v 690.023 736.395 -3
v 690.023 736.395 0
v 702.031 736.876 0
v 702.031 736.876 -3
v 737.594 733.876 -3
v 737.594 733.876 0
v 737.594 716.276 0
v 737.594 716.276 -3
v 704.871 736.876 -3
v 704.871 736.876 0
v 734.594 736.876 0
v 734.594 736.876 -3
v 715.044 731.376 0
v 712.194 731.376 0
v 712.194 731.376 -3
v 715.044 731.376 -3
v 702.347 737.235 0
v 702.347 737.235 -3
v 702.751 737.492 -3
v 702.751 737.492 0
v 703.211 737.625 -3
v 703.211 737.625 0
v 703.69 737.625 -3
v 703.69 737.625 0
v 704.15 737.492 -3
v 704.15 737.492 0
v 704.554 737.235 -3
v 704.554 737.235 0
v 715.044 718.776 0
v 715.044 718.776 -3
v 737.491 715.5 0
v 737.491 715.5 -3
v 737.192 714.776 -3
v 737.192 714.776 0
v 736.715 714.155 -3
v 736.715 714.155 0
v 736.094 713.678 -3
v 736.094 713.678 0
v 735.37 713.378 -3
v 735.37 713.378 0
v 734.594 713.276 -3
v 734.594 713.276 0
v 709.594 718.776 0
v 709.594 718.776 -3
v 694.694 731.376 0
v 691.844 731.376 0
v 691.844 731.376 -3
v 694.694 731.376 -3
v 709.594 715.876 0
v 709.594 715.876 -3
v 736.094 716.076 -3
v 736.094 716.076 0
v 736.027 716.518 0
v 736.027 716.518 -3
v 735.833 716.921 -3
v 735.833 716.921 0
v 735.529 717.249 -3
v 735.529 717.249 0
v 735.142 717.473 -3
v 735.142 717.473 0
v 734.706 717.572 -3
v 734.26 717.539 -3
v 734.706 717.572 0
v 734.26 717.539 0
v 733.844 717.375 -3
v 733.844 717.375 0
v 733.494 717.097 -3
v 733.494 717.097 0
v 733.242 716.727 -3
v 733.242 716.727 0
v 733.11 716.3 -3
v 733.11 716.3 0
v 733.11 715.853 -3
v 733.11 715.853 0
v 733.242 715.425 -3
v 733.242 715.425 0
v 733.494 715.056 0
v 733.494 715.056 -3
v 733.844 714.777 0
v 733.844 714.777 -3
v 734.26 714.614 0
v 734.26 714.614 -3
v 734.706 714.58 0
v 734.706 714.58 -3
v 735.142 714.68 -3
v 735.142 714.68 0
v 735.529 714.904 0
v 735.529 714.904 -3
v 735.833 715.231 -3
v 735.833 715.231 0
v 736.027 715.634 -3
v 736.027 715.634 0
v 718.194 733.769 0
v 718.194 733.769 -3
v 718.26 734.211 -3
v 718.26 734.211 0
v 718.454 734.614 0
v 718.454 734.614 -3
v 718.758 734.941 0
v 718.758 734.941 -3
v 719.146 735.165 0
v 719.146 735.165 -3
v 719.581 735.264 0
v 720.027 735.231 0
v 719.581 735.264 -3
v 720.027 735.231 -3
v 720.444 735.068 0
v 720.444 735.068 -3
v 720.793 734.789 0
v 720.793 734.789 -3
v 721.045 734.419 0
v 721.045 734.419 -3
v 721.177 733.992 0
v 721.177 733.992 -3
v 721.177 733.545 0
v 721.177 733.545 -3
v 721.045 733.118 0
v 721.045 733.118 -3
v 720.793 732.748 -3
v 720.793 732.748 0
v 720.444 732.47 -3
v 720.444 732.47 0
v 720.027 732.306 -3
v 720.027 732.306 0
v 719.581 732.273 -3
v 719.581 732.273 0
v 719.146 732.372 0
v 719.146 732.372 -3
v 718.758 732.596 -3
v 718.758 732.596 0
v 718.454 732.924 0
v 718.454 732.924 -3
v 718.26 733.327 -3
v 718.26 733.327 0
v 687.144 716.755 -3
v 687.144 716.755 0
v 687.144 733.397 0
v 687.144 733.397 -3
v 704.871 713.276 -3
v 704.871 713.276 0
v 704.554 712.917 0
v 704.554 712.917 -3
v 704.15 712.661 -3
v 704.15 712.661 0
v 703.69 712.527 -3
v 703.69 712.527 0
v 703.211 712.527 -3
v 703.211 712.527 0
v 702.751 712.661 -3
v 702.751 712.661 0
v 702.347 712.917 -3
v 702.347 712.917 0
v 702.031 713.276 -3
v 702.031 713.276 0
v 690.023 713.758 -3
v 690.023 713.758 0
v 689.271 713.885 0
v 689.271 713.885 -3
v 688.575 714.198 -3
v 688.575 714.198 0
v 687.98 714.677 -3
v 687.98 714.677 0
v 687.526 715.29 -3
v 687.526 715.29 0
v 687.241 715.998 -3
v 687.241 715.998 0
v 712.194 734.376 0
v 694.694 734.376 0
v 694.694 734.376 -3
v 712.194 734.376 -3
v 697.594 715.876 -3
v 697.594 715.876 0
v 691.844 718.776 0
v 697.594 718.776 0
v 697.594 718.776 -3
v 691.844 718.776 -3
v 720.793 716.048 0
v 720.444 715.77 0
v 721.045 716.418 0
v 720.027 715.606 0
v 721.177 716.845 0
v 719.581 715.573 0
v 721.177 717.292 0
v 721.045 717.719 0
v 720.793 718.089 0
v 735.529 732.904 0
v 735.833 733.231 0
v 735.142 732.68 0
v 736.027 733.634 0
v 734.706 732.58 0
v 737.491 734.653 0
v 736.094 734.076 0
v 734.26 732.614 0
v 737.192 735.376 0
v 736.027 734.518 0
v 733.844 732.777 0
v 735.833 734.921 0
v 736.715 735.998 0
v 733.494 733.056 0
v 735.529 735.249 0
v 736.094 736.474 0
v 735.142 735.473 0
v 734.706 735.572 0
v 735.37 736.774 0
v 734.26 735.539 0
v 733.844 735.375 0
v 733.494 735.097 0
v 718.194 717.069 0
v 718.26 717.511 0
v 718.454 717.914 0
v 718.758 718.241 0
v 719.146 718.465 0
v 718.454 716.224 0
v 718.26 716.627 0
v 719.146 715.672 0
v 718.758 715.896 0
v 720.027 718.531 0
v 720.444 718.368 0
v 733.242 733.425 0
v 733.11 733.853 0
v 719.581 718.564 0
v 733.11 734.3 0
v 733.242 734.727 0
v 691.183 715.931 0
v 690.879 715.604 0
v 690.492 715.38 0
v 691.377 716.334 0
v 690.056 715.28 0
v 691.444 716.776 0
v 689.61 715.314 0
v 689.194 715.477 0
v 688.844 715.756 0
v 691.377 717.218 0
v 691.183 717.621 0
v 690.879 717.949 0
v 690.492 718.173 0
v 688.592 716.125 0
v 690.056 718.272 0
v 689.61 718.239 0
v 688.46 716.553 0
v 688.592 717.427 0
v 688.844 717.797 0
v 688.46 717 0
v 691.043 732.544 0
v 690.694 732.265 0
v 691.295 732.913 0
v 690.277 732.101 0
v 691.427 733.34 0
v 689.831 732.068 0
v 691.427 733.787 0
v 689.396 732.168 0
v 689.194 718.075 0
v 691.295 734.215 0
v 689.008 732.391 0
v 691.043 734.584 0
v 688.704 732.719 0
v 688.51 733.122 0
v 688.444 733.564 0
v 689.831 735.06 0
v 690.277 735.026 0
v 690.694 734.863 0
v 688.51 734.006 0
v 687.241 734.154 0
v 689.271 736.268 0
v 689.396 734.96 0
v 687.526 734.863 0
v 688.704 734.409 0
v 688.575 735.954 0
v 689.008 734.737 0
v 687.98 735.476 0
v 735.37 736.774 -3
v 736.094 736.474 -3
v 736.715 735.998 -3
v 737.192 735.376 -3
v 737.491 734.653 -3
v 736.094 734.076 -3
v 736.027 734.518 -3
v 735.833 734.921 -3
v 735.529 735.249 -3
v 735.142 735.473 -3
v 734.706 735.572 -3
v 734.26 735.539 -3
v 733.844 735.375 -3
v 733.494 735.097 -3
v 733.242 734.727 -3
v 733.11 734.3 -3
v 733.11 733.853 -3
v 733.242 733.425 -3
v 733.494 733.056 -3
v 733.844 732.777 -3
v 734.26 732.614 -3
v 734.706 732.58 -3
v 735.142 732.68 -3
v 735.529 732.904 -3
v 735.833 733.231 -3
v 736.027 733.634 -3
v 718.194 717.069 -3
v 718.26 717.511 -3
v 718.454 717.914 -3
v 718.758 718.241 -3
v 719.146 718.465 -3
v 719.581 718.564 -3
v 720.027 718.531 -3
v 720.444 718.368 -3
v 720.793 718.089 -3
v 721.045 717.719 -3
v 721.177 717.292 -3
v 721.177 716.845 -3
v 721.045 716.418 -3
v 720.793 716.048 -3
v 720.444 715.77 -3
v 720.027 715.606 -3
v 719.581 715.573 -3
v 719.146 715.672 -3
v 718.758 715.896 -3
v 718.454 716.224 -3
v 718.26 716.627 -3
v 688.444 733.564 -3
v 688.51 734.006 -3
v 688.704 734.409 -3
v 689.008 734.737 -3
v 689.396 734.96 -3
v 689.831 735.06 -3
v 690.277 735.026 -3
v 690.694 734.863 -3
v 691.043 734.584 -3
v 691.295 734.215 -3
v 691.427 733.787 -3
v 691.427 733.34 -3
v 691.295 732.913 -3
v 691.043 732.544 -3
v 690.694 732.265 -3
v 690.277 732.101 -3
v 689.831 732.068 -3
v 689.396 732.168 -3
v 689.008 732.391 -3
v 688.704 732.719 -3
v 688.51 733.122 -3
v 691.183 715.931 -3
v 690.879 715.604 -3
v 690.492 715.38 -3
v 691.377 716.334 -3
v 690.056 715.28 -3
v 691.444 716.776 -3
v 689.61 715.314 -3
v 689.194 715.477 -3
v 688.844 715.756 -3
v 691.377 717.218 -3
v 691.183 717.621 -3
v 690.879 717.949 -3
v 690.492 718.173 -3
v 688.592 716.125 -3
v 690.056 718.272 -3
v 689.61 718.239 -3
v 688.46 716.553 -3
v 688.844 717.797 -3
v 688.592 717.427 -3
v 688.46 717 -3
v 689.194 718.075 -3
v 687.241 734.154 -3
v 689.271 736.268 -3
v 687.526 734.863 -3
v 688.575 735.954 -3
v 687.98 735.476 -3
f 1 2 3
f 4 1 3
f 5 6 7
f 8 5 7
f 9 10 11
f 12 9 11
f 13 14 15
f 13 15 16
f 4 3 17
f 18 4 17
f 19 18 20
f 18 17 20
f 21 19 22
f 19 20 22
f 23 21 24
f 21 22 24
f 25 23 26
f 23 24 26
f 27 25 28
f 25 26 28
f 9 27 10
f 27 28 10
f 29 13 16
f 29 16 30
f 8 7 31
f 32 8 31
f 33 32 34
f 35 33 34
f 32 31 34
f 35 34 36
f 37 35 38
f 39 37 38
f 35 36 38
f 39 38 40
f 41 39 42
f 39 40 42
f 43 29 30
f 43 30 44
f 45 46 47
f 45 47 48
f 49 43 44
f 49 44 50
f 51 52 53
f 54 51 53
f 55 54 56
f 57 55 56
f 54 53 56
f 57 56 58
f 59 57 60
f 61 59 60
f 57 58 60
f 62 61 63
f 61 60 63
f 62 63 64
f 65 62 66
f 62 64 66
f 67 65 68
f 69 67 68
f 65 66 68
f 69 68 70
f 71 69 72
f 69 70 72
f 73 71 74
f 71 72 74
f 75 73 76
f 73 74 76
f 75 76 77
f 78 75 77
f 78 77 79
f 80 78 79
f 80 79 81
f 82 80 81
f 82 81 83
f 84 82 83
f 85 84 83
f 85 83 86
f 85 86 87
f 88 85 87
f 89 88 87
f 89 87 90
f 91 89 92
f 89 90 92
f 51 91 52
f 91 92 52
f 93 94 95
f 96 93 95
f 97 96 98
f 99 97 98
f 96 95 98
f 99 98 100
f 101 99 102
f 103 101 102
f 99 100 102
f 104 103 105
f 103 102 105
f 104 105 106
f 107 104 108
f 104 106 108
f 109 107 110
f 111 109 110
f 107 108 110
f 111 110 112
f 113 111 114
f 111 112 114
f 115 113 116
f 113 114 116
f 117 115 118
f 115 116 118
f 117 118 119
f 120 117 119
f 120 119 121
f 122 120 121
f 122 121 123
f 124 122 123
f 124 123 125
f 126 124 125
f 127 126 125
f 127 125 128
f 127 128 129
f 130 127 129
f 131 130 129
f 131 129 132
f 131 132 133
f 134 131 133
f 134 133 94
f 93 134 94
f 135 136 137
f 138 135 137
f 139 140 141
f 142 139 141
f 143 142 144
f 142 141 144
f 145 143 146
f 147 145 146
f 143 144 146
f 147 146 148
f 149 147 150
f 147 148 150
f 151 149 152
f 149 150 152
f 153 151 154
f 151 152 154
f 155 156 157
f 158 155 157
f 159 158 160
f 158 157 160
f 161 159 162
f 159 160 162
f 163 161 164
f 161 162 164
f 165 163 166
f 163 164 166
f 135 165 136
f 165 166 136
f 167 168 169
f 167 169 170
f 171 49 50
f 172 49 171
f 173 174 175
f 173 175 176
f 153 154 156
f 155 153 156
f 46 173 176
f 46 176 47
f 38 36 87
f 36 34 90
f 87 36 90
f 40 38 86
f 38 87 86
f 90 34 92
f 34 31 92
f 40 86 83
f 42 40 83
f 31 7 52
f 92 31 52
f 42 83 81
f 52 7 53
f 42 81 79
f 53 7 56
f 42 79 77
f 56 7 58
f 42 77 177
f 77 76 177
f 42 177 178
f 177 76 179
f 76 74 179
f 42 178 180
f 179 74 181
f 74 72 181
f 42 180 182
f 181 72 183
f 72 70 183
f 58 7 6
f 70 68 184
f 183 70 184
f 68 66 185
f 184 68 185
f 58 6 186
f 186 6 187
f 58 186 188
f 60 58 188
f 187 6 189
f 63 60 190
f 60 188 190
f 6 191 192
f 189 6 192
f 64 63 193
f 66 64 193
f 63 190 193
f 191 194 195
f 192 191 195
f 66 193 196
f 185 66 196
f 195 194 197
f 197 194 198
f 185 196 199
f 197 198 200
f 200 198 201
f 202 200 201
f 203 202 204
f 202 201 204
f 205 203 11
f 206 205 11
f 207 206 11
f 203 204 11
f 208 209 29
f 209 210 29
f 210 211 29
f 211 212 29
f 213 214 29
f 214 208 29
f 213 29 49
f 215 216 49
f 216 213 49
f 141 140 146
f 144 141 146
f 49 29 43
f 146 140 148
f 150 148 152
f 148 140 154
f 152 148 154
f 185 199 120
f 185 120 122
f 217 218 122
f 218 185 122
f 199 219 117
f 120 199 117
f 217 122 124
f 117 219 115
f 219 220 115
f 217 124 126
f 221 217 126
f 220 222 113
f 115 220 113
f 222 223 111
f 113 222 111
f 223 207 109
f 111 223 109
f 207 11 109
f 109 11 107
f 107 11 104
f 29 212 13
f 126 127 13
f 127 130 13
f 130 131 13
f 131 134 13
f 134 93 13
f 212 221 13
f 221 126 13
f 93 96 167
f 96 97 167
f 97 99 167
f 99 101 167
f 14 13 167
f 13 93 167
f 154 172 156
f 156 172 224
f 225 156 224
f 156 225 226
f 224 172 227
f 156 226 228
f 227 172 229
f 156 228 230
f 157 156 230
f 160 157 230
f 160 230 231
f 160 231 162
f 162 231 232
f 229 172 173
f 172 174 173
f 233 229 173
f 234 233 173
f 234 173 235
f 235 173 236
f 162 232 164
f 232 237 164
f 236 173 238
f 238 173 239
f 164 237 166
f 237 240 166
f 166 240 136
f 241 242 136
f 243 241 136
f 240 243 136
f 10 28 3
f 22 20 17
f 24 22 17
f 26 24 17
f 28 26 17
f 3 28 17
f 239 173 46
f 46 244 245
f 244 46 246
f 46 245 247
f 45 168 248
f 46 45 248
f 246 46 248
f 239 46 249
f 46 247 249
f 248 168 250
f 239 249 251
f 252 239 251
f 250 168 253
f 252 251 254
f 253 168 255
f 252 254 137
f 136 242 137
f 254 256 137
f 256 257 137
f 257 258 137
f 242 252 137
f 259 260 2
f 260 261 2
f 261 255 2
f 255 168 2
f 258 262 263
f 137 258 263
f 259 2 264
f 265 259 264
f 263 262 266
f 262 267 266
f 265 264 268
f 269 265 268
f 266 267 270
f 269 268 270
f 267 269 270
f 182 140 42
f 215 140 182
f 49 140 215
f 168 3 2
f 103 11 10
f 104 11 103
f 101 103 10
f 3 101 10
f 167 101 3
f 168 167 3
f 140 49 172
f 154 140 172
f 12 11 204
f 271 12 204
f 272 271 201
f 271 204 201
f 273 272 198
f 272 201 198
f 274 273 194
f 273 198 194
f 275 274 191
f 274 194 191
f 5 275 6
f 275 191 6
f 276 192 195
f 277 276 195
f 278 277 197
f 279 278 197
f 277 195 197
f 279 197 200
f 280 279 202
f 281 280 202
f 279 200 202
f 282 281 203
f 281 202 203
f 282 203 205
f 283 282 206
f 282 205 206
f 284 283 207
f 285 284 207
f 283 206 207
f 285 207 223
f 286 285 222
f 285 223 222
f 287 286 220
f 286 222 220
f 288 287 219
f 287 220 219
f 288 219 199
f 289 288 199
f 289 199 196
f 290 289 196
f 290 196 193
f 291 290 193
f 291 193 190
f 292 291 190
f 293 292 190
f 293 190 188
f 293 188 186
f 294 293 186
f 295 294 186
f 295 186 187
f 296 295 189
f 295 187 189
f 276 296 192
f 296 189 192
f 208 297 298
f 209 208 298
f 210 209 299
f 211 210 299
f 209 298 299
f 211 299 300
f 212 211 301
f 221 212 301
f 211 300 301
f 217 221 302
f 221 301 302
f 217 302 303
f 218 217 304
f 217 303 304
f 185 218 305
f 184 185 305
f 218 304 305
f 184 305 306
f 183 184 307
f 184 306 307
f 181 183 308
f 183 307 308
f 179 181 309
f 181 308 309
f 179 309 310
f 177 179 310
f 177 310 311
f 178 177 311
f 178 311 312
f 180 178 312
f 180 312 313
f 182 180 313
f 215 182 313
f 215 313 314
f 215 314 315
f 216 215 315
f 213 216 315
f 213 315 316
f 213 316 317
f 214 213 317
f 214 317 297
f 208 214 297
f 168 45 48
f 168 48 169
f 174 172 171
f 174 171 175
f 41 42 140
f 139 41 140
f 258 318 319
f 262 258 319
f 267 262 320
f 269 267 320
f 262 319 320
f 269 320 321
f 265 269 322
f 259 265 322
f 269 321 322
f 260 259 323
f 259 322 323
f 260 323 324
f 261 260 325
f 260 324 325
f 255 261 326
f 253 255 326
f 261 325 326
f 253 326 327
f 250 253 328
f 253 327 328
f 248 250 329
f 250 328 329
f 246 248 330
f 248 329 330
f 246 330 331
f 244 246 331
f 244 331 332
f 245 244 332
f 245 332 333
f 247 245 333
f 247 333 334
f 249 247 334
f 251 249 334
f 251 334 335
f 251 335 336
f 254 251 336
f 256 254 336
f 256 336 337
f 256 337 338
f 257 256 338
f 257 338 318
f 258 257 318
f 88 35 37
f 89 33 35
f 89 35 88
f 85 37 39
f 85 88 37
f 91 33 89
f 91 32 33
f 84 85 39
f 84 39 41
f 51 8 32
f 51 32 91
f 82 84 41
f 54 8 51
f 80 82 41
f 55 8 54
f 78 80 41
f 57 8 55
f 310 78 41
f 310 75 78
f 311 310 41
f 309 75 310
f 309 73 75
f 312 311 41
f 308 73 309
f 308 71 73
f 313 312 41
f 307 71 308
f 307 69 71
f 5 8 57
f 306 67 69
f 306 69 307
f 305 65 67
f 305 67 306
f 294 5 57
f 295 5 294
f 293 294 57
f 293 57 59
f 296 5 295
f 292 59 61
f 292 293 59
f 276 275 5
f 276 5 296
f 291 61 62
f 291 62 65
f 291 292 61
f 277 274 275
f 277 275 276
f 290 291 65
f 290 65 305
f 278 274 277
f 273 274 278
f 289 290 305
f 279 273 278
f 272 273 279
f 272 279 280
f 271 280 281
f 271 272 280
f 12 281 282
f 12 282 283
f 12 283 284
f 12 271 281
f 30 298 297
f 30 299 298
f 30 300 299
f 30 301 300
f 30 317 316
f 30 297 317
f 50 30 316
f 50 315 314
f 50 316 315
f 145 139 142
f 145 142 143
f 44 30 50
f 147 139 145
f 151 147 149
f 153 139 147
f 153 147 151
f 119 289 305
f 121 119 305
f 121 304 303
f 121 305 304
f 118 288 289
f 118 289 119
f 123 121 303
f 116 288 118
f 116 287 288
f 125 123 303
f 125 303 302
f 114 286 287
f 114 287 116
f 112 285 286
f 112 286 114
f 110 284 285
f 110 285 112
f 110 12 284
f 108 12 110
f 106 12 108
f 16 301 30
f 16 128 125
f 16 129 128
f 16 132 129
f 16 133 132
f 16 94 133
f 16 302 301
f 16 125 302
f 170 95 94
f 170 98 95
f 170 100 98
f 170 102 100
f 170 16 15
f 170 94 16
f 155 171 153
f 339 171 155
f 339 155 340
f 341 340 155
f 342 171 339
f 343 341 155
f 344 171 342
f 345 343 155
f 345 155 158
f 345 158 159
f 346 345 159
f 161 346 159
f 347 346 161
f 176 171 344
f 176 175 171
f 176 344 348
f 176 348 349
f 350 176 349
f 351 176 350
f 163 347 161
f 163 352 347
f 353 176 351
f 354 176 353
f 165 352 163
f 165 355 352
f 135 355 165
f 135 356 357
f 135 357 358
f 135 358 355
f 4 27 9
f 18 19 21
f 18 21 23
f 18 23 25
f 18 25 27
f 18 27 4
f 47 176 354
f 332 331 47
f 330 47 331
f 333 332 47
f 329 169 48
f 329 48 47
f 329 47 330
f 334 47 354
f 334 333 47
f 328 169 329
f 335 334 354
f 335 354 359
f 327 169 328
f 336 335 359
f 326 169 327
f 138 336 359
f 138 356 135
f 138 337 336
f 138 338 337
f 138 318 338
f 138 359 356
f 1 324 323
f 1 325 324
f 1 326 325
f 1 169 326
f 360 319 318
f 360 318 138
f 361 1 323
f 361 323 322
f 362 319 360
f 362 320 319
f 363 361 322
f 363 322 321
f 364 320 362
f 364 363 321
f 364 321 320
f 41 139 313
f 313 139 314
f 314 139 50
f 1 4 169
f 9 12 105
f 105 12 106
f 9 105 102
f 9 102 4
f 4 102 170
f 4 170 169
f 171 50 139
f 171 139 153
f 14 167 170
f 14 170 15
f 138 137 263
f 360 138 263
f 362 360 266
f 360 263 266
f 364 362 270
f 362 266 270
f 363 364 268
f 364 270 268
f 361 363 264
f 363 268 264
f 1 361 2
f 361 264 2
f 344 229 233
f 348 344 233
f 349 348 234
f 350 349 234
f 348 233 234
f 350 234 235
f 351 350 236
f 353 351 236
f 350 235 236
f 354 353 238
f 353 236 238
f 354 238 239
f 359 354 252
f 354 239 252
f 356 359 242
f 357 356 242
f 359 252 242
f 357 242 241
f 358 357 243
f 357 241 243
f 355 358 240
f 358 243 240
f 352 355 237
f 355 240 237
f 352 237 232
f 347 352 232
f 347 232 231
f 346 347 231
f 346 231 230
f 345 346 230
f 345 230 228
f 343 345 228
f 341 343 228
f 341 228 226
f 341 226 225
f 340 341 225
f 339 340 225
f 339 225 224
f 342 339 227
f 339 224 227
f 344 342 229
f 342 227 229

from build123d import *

# Parameters (mm, degrees)
ESQUISSE1_R               = 1.5
T_LE_DE_BASE_PLI_E1_DEPTH = 3
ESQUISSE6_R               = 1.5
ENL_V_MAT_EXTRU_2_DEPTH   = 10


# Sheet-metal steps are written as plain solids
with BuildPart() as part:
    # Esquisse1 → Tôle de base pliée1 (new body)
    with BuildSketch(Plane.XY):
        with BuildLine():
            Line((737.593549902, 733.8762623), (737.593549902, 716.2762623))
            ThreePointArc((737.593549902, 716.2762623), (736.714870246, 714.154941957), (734.593549902, 713.2762623))
            Line((734.593549902, 713.2762623), (704.870597735, 713.2762623))
            ThreePointArc((704.870597735, 713.2762623), (703.450597735, 712.510086472), (702.030597735, 713.2762623))
            Line((702.030597735, 713.2762623), (690.023398786, 713.757541233))
            ThreePointArc((690.023398786, 713.757541233), (687.980166748, 714.67672778), (687.143549902, 716.755134219))
            Line((687.143549902, 716.755134219), (687.143549902, 733.397390382))
            ThreePointArc((687.143549902, 733.397390382), (687.980166748, 735.475796821), (690.023398786, 736.394983368))
            Line((690.023398786, 736.394983368), (702.030597735, 736.8762623))
            ThreePointArc((702.030597735, 736.8762623), (703.450597735, 737.642438129), (704.870597735, 736.8762623))
            Line((704.870597735, 736.8762623), (734.593549902, 736.8762623))
            ThreePointArc((734.593549902, 736.8762623), (736.714870246, 735.997582644), (737.593549902, 733.8762623))
        make_face()
        with Locations((689.943549902, 716.7762623)):
            Circle(ESQUISSE1_R, mode=Mode.SUBTRACT)
        with Locations((734.593549902, 716.0762623)):
            Circle(ESQUISSE1_R, mode=Mode.SUBTRACT)
        with Locations((734.593549902, 734.0762623)):
            Circle(ESQUISSE1_R, mode=Mode.SUBTRACT)
        Polygon((694.693549902, 734.3762623), (712.193549902, 734.3762623), (712.193549902, 731.3762623), (715.043549902, 731.3762623), (715.043549902, 718.7762623), (709.593549902, 718.7762623), (709.593549902, 715.8762623), (697.593549902, 715.8762623), (697.593549902, 718.7762623), (691.843549902, 718.7762623), (691.843549902, 731.3762623), (694.693549902, 731.3762623), align=None, mode=Mode.SUBTRACT)
    extrude(amount=-T_LE_DE_BASE_PLI_E1_DEPTH)

    # Esquisse6 → Enlèv. mat.-Extru.2 (cut)
    with BuildSketch(Plane(origin=(0, 0, -3), x_dir=(-1, 0, 0), z_dir=(0, 0, -1))):
        with Locations((-719.693549902, 733.768635687)):
            Circle(ESQUISSE6_R)
        with Locations((-719.693549902, 717.068635687)):
            Circle(ESQUISSE6_R)
        with Locations((-689.943549902, 733.563854452)):
            Circle(ESQUISSE6_R)
    extrude(amount=-ENL_V_MAT_EXTRU_2_DEPTH, mode=Mode.SUBTRACT)


solid = part.part
